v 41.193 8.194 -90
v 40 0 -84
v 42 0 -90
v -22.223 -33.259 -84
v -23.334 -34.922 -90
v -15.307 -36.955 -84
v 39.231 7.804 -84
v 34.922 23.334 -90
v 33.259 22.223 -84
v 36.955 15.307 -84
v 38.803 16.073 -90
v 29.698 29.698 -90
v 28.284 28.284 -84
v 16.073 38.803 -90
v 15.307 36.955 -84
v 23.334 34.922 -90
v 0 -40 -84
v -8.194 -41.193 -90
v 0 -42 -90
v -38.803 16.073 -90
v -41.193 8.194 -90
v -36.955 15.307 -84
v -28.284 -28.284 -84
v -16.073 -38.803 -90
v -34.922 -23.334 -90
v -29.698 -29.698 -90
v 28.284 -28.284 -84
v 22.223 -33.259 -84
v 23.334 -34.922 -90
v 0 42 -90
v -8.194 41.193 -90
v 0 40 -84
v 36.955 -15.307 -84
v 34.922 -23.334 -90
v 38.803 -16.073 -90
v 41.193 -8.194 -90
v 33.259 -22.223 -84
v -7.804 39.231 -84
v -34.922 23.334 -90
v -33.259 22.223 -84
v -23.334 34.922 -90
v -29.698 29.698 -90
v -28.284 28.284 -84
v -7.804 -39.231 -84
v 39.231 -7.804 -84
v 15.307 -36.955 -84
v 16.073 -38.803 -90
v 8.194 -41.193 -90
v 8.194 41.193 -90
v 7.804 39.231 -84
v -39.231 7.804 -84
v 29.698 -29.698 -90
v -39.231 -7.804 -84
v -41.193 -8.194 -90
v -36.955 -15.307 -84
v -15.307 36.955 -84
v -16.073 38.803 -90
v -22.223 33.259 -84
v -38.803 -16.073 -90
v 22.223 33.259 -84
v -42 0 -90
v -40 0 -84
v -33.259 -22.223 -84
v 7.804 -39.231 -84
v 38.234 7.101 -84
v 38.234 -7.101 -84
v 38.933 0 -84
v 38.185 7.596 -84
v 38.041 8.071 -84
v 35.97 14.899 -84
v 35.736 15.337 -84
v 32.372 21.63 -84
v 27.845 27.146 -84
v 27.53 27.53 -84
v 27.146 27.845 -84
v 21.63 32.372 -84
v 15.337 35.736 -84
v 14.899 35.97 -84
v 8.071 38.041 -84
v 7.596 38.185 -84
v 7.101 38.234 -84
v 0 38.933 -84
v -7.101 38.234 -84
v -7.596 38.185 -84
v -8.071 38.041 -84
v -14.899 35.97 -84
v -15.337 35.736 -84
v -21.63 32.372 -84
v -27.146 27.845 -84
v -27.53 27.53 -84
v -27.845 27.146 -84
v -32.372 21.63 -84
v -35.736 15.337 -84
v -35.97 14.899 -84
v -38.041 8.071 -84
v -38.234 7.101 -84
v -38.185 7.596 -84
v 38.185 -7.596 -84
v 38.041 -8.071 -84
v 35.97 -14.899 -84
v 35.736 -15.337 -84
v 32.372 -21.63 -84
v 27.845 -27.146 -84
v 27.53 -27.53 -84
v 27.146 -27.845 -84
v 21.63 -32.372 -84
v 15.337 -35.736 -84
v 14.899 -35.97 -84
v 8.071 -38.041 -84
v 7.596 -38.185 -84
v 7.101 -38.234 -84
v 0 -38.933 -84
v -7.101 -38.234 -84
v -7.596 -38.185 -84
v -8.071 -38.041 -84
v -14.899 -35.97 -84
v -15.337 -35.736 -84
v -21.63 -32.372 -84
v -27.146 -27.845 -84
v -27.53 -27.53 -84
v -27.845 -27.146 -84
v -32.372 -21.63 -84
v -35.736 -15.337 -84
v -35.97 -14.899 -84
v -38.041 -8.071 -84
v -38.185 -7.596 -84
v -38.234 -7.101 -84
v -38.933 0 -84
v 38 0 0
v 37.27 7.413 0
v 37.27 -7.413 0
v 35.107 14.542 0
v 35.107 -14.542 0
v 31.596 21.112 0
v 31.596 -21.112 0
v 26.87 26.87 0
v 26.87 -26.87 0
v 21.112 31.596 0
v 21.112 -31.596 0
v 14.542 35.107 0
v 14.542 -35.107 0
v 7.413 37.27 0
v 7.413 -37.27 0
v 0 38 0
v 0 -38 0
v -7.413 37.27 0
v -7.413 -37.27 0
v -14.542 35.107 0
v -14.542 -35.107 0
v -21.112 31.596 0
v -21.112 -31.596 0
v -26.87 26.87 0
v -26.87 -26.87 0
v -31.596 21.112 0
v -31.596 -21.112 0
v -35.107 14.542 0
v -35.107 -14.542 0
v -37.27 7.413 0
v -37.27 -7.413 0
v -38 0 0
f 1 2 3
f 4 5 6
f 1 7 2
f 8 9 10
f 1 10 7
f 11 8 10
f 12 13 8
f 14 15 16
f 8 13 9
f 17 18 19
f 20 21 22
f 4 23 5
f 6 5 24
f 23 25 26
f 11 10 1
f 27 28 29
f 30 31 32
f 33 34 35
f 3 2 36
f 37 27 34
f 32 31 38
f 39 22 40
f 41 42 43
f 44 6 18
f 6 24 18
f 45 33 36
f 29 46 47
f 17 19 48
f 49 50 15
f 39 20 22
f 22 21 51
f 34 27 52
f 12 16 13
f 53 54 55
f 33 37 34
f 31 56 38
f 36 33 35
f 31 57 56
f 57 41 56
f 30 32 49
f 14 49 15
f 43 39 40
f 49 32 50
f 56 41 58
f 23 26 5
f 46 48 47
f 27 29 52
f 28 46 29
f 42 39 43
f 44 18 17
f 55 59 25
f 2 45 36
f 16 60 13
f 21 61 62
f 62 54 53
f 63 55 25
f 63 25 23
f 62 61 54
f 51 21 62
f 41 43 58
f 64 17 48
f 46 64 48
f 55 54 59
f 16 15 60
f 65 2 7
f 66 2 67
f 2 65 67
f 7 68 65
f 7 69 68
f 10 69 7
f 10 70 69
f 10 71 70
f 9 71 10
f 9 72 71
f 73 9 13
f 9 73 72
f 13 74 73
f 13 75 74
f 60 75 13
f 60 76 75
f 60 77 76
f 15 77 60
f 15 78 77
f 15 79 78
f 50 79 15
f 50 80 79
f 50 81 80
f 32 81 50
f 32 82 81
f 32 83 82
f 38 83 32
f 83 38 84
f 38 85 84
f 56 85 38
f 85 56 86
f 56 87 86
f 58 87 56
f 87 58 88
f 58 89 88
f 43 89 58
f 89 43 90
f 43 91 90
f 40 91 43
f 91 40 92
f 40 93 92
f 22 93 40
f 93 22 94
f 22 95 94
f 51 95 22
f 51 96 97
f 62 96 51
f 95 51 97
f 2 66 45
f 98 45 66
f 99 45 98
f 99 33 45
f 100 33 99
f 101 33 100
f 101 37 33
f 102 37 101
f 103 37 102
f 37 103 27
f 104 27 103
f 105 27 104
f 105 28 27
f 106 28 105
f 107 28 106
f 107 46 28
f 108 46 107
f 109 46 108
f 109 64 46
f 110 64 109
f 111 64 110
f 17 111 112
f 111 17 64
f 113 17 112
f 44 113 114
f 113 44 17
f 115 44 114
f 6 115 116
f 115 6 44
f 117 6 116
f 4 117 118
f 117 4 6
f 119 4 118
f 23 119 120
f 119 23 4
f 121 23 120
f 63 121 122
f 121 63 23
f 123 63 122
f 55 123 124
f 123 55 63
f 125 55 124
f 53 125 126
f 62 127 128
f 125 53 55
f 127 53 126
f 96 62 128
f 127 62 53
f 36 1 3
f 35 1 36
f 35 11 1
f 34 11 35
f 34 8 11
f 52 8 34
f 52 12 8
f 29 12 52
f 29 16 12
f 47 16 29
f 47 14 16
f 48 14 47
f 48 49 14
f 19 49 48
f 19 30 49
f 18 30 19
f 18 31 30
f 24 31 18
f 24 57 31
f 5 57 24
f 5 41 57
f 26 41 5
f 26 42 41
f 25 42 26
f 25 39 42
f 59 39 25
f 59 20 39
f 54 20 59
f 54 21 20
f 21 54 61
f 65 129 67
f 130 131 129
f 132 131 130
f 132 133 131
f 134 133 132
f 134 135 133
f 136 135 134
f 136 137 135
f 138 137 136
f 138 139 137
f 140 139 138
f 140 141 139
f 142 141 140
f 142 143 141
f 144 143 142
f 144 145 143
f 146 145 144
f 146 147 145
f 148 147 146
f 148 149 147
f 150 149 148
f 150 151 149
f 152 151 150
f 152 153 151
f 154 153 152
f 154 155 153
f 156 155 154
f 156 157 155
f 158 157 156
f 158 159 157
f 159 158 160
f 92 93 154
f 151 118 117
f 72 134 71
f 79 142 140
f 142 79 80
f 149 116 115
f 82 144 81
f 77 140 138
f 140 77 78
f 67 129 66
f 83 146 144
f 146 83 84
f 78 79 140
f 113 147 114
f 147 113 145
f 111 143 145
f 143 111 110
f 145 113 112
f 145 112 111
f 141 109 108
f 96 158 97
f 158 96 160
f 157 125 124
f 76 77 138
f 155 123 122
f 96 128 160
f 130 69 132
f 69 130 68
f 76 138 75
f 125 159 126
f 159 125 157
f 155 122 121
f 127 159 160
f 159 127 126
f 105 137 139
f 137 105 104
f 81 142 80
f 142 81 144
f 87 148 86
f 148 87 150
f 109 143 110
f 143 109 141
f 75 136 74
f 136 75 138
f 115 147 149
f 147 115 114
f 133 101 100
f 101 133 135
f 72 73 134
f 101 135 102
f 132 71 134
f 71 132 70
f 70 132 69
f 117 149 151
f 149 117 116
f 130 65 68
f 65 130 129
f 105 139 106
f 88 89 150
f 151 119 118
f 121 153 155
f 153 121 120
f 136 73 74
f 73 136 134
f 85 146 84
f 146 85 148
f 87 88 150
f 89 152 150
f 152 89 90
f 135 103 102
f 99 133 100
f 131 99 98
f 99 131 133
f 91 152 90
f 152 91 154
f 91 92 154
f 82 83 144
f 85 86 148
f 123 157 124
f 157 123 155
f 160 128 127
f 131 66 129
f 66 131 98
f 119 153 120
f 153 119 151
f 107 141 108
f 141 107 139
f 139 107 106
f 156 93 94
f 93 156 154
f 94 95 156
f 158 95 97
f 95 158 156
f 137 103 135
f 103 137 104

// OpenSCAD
use <main.scad>
robot_body_height  = 300;
lidar_pos_x        = 368;
lidar_mount_height = 390;
show_component_labels = false;
translate([-lidar_pos_x, 0, -lidar_mount_height])
    lidar_pedestal();
